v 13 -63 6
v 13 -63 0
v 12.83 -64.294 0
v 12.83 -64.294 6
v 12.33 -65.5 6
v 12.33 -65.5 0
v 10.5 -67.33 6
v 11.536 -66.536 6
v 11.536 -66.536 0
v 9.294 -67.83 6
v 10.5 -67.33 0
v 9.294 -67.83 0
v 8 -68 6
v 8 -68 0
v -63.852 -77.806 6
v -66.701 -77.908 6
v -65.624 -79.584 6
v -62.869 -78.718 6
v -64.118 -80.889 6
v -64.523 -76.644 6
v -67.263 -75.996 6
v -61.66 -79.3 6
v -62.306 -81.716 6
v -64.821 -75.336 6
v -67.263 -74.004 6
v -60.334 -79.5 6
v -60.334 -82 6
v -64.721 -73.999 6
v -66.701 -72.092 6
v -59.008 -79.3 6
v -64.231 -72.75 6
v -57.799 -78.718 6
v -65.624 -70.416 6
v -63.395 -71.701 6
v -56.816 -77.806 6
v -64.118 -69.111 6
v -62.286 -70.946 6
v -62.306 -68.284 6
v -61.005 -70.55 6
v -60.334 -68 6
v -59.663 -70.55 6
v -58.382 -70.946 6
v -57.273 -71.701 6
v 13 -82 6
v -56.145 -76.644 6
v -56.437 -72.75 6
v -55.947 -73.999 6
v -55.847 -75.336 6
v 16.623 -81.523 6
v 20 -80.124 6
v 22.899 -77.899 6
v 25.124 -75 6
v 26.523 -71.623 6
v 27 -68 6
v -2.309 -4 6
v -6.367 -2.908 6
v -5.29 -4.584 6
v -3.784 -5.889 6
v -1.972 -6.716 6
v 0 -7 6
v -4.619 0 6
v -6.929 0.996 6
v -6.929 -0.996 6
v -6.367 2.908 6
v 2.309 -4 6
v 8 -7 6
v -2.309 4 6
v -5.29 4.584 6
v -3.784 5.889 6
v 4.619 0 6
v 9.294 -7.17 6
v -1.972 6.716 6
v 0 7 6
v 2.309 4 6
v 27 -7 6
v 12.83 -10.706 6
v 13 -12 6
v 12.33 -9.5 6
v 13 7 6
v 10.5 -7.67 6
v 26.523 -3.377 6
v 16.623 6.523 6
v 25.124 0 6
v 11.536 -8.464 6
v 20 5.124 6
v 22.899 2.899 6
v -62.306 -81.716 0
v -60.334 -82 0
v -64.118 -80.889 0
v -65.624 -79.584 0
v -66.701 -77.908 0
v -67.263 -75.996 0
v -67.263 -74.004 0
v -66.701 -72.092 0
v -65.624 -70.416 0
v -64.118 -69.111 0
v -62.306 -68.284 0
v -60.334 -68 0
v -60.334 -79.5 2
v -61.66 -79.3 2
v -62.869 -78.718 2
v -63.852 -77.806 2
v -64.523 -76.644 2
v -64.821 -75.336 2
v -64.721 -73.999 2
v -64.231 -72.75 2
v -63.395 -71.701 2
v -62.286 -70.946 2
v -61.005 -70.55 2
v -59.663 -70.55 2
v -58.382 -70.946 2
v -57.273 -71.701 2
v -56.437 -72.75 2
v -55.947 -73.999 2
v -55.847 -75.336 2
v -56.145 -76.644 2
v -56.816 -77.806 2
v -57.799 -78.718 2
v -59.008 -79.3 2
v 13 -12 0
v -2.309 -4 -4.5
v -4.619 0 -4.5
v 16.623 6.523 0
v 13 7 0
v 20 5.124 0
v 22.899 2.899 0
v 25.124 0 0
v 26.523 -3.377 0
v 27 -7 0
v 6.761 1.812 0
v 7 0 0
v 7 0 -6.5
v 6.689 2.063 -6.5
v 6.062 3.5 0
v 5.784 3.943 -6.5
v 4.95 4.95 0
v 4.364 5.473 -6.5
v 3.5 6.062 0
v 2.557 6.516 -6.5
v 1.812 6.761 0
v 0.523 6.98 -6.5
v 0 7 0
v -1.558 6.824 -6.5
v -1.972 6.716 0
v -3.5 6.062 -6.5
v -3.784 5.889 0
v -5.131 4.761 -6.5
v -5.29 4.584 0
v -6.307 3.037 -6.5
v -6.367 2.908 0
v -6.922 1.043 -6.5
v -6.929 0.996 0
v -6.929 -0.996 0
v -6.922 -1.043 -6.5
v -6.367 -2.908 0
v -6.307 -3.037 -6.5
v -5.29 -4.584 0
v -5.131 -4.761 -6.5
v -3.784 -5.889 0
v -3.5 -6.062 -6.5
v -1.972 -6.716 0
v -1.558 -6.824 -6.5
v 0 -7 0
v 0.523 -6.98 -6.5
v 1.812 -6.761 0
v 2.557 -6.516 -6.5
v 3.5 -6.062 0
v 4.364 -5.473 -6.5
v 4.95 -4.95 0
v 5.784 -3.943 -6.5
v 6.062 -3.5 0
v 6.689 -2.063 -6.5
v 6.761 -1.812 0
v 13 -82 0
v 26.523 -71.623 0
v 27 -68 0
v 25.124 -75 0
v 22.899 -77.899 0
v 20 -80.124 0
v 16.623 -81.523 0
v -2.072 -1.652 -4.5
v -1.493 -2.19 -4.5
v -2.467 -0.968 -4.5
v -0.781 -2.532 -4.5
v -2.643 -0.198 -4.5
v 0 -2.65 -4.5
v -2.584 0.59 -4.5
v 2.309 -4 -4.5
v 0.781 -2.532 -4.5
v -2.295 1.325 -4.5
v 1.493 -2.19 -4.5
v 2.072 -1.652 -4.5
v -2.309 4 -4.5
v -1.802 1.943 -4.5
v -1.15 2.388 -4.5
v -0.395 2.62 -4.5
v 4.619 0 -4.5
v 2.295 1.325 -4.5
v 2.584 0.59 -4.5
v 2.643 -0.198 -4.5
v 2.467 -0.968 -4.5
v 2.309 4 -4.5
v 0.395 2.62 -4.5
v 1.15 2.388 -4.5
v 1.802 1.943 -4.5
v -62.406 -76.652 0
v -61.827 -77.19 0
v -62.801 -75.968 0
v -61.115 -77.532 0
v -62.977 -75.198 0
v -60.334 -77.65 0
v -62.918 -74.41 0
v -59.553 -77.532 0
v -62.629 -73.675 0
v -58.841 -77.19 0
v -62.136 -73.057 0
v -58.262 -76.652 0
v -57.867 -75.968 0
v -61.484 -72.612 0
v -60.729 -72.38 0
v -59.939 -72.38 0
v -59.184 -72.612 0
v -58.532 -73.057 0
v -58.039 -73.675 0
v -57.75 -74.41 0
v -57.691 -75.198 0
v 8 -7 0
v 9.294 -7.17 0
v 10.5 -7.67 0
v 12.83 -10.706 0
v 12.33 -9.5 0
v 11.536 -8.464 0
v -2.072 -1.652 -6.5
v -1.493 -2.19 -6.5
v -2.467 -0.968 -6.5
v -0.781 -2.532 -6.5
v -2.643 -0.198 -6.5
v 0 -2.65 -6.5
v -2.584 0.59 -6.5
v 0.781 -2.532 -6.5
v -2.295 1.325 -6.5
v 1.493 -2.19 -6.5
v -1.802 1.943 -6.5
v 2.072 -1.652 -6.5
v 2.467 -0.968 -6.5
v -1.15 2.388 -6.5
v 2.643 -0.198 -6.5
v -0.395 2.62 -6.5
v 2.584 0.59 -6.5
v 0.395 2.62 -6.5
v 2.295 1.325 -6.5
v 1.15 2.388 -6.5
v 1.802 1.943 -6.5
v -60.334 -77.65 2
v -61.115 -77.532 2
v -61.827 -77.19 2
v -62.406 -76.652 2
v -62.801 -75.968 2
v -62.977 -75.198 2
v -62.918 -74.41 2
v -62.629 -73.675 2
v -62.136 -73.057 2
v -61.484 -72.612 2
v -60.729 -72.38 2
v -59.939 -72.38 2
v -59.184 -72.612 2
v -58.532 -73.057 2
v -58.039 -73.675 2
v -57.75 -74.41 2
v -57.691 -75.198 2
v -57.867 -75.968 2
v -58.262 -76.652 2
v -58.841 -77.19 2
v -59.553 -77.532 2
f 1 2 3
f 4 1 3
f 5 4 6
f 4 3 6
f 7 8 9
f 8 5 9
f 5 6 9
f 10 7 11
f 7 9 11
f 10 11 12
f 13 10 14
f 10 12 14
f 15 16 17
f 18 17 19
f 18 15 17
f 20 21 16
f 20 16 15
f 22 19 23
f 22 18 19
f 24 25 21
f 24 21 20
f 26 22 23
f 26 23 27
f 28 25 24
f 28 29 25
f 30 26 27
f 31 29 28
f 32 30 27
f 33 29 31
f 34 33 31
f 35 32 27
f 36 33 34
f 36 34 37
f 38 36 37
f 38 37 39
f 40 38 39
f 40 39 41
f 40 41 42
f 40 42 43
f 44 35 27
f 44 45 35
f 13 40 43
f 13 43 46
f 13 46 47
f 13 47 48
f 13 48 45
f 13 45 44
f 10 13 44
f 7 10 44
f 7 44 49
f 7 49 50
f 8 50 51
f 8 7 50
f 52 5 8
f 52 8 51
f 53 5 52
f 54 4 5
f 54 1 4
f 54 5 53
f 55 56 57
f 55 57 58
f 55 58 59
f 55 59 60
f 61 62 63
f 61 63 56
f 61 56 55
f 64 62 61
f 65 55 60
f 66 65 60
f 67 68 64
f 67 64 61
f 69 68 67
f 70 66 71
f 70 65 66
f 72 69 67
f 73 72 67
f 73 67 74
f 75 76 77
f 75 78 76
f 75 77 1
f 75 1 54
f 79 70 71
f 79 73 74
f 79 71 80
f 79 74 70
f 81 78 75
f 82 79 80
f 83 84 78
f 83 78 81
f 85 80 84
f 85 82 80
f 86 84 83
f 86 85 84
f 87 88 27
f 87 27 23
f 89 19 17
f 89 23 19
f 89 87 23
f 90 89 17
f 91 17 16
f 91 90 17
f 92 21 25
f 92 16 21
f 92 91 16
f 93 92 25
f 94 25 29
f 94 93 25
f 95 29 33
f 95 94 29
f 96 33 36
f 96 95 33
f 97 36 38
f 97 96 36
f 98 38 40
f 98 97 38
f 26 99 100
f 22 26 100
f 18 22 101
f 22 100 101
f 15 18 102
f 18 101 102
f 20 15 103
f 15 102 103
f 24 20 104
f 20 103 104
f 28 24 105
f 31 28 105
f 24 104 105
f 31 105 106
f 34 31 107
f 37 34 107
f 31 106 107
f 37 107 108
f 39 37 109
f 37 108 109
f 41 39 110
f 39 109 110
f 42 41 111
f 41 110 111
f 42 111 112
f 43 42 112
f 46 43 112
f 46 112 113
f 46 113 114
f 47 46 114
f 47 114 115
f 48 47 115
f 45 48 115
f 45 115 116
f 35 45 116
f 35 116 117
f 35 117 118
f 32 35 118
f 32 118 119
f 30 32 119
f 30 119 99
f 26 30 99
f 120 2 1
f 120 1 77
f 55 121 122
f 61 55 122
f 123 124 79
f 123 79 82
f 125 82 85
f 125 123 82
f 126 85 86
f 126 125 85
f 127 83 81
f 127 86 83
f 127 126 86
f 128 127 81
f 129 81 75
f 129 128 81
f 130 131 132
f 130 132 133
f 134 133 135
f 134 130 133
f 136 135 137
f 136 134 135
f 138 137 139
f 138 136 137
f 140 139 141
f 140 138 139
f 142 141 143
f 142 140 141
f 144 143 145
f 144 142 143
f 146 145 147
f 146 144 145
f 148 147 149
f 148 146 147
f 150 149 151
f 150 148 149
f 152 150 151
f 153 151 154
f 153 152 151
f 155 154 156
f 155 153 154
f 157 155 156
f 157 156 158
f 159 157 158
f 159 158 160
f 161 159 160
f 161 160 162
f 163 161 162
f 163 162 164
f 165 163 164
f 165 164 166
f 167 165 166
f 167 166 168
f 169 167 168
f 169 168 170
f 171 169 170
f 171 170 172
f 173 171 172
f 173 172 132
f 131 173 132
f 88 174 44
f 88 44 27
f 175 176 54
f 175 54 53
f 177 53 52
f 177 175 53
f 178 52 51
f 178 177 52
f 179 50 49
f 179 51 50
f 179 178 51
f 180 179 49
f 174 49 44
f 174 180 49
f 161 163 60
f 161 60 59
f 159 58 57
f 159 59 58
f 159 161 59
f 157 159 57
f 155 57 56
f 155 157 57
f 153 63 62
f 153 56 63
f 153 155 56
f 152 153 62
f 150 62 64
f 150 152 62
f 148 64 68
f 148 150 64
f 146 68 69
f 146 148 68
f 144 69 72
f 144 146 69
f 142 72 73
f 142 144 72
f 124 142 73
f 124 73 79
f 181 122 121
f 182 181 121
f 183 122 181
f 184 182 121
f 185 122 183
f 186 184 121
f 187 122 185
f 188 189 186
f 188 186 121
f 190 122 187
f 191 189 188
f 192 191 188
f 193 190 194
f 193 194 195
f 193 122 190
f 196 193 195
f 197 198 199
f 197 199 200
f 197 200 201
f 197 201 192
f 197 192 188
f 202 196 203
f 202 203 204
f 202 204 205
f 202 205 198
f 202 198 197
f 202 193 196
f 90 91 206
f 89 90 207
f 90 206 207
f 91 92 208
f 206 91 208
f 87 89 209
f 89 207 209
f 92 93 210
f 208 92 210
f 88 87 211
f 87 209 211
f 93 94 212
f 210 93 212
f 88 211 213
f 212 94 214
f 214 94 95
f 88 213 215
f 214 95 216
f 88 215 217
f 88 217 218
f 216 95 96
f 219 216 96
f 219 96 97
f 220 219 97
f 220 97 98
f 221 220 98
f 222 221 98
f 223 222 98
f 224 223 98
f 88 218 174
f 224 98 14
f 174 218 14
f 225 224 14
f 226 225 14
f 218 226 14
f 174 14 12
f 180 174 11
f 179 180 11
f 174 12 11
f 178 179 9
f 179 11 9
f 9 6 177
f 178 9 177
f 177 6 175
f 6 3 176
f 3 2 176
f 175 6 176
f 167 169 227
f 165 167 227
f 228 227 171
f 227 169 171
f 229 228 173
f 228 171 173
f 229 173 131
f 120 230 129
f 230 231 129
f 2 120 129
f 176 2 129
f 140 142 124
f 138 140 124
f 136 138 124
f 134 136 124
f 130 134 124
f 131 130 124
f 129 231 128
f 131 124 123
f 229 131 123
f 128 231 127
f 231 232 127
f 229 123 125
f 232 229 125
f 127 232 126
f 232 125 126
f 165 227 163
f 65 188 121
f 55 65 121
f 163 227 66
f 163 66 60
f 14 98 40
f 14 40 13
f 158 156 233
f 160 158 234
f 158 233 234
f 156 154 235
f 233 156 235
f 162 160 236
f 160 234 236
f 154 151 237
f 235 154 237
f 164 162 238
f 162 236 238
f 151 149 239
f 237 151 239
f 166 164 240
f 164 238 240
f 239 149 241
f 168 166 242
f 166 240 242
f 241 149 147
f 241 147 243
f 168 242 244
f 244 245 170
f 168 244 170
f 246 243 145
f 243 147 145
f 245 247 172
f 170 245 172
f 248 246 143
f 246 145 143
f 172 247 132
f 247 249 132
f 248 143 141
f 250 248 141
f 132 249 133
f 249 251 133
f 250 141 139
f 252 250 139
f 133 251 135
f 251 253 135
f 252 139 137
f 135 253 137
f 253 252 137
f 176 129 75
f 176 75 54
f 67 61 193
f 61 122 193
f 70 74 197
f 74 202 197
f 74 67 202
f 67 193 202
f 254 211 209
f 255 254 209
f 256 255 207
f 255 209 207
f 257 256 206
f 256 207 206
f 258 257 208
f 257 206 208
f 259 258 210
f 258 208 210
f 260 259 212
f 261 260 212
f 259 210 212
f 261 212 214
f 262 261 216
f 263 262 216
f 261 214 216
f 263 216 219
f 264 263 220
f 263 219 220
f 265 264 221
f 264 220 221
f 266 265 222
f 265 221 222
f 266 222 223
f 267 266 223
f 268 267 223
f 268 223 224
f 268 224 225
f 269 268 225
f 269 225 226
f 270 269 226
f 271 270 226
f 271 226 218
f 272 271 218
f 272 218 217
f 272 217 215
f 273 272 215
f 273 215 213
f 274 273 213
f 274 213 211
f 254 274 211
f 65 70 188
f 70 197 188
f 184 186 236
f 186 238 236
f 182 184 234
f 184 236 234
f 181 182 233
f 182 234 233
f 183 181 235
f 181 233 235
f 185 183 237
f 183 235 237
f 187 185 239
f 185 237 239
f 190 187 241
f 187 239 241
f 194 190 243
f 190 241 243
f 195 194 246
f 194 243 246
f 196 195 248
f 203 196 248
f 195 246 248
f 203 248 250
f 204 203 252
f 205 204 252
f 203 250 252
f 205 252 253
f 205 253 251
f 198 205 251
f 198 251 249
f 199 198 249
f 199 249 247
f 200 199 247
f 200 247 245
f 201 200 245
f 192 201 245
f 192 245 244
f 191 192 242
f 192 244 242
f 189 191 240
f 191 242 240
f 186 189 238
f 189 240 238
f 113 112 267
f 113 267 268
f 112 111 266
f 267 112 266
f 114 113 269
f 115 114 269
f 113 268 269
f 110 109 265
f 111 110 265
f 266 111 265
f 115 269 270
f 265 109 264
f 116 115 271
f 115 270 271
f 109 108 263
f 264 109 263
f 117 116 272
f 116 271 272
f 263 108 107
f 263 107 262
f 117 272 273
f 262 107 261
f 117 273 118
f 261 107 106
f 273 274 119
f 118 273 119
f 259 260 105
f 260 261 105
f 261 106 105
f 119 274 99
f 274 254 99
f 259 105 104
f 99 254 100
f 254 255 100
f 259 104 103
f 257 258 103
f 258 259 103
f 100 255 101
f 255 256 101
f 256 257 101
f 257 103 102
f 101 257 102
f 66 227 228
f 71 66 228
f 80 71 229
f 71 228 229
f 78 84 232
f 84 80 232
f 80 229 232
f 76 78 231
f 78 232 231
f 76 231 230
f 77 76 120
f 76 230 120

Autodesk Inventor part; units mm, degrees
ref_plane "YZ Plane" through (0, 0, 0) normal (1, 0, 0) x (0, 1, 0)
ref_plane "XZ Plane" through (0, 0, 0) normal (0, 1, 0) x (-1, 0, 0)
ref_plane "XY Plane" through (0, 0, 0) normal (0, 0, 1) x (1, 0, 0)
sketch "Skizze1" plane through (0, 0, 0) normal (0, 0, 1) x (1, 0, 0)
  circle A0 centre (0, 0) radius 2.5
  line L0 (0, 7) -> (13, 7)
  arc A1 (0, 7) -> (0, -7) centre (0, 0) ccw
  circle A2 centre (-60.334, -75) radius 2.5
  line L1 (-60.334, -68) -> (8, -68)
  line L2 (13, -63) -> (13, -12)
  line L3 (27, -7) -> (27, -68)
  line L4 (13, -82) -> (-60.334, -82)
  arc A3 (-60.334, -68) -> (-60.334, -82) centre (-60.334, -75) ccw
  line L5 (20, -82) -> (20, 7) construction
  line L6 (0, 0) -> (-60.334, -75) construction
  line L7 (-60.334, -75) -> (-110.6881, -137.5941) construction
  line L8 (-60.334, -75) -> (20, -75) construction
  circle A4 centre (-60.334, -75) radius 7
  arc A5 (27, -7) -> (13, 7) centre (13, -7) ccw
  arc A6 (13, -82) -> (27, -68) centre (13, -68) ccw
  arc A7 (8, -68) -> (13, -63) centre (8, -63) ccw
  arc A8 (13, -12) -> (8, -7) centre (8, -12) ccw
  circle A9 centre (0, 0) radius 7
  line L9 (8, -7) -> (0, -7)
  line L10 (-2.3094, -4) -> (-4.6188, 0)
  line L11 (-4.6188, 0) -> (-2.3094, 4)
  line L12 (-2.3094, 4) -> (2.3094, 4)
  line L13 (2.3094, 4) -> (4.6188, 0)
  line L14 (4.6188, 0) -> (2.3094, -4)
  line L15 (2.3094, -4) -> (-2.3094, -4)
  point P0 (-60.334, -68)
  point P1 (13, 7)
  point P2 (0, -7)
  point P3 (0, -7)
  dimension "d0" = 5
  dimension "d10" = 75
  dimension "d11" = 14
  dimension "d14" = 176.5899
  dimension "d19" = 20
  dimension "d20" = 7
  dimension "d25" = 5
  dimension "d26" = 14
  dimension "d41" = 8
extrude "Extrusion1" add sketch "Skizze1" along normal blind 6 contours A9 A1 | L0 A5 L3 A6 L4 A4 L1 A7 L2 A8 L9 A9 | A3 A4 | L10 L11 L12 L13 L14 L15
extrude "Extrusion2" add sketch "Skizze1" against normal blind 6.5 contours A9 A1 | L10 L11 L12 L13 L14 L15
sketch "Skizze2" plane through (0, 0, 6) normal (0, 0, 1) x (1, 0, 0)
  circle A0 centre (-60.334, -75) radius 2.5 projected
  circle A1 centre (0, 0) radius 2.5 projected
hole "Bohrung1" at (-60.334, -75, 6) direction (0, 0, -1) diameter 5.3 end through all counterbore diameter 9 counterbore depth 4 clearance for "Inbusschraube DIN EN ISO 4762" size "M5" standard "DIN"
sketch "Skizze3" plane through (0, 0, 6) normal (0, 0, 1) x (1, 0, 0)
  circle A0 centre (0, 0) radius 2.5 projected
hole "Bohrung2" at (0, 0, 6) direction (0, 0, -1) diameter 5.3 end through all clearance for "Inbusschraube DIN EN ISO 4762" size "M5" standard "DIN"
extrude "Extrusion3" cut sketch "Skizze1" along normal blind 6 and the other way blind 4.5 contours L10 L11 L12 L13 L14 L15
equation "\"d11\" = 2 * d20"
equation "\"d26\" = 2 * d20"
equation "\"d42\" = d6"
equation "\"d6\" = 6"
properties part number "Door_Lever2" material "ABS-Kunststoff"
